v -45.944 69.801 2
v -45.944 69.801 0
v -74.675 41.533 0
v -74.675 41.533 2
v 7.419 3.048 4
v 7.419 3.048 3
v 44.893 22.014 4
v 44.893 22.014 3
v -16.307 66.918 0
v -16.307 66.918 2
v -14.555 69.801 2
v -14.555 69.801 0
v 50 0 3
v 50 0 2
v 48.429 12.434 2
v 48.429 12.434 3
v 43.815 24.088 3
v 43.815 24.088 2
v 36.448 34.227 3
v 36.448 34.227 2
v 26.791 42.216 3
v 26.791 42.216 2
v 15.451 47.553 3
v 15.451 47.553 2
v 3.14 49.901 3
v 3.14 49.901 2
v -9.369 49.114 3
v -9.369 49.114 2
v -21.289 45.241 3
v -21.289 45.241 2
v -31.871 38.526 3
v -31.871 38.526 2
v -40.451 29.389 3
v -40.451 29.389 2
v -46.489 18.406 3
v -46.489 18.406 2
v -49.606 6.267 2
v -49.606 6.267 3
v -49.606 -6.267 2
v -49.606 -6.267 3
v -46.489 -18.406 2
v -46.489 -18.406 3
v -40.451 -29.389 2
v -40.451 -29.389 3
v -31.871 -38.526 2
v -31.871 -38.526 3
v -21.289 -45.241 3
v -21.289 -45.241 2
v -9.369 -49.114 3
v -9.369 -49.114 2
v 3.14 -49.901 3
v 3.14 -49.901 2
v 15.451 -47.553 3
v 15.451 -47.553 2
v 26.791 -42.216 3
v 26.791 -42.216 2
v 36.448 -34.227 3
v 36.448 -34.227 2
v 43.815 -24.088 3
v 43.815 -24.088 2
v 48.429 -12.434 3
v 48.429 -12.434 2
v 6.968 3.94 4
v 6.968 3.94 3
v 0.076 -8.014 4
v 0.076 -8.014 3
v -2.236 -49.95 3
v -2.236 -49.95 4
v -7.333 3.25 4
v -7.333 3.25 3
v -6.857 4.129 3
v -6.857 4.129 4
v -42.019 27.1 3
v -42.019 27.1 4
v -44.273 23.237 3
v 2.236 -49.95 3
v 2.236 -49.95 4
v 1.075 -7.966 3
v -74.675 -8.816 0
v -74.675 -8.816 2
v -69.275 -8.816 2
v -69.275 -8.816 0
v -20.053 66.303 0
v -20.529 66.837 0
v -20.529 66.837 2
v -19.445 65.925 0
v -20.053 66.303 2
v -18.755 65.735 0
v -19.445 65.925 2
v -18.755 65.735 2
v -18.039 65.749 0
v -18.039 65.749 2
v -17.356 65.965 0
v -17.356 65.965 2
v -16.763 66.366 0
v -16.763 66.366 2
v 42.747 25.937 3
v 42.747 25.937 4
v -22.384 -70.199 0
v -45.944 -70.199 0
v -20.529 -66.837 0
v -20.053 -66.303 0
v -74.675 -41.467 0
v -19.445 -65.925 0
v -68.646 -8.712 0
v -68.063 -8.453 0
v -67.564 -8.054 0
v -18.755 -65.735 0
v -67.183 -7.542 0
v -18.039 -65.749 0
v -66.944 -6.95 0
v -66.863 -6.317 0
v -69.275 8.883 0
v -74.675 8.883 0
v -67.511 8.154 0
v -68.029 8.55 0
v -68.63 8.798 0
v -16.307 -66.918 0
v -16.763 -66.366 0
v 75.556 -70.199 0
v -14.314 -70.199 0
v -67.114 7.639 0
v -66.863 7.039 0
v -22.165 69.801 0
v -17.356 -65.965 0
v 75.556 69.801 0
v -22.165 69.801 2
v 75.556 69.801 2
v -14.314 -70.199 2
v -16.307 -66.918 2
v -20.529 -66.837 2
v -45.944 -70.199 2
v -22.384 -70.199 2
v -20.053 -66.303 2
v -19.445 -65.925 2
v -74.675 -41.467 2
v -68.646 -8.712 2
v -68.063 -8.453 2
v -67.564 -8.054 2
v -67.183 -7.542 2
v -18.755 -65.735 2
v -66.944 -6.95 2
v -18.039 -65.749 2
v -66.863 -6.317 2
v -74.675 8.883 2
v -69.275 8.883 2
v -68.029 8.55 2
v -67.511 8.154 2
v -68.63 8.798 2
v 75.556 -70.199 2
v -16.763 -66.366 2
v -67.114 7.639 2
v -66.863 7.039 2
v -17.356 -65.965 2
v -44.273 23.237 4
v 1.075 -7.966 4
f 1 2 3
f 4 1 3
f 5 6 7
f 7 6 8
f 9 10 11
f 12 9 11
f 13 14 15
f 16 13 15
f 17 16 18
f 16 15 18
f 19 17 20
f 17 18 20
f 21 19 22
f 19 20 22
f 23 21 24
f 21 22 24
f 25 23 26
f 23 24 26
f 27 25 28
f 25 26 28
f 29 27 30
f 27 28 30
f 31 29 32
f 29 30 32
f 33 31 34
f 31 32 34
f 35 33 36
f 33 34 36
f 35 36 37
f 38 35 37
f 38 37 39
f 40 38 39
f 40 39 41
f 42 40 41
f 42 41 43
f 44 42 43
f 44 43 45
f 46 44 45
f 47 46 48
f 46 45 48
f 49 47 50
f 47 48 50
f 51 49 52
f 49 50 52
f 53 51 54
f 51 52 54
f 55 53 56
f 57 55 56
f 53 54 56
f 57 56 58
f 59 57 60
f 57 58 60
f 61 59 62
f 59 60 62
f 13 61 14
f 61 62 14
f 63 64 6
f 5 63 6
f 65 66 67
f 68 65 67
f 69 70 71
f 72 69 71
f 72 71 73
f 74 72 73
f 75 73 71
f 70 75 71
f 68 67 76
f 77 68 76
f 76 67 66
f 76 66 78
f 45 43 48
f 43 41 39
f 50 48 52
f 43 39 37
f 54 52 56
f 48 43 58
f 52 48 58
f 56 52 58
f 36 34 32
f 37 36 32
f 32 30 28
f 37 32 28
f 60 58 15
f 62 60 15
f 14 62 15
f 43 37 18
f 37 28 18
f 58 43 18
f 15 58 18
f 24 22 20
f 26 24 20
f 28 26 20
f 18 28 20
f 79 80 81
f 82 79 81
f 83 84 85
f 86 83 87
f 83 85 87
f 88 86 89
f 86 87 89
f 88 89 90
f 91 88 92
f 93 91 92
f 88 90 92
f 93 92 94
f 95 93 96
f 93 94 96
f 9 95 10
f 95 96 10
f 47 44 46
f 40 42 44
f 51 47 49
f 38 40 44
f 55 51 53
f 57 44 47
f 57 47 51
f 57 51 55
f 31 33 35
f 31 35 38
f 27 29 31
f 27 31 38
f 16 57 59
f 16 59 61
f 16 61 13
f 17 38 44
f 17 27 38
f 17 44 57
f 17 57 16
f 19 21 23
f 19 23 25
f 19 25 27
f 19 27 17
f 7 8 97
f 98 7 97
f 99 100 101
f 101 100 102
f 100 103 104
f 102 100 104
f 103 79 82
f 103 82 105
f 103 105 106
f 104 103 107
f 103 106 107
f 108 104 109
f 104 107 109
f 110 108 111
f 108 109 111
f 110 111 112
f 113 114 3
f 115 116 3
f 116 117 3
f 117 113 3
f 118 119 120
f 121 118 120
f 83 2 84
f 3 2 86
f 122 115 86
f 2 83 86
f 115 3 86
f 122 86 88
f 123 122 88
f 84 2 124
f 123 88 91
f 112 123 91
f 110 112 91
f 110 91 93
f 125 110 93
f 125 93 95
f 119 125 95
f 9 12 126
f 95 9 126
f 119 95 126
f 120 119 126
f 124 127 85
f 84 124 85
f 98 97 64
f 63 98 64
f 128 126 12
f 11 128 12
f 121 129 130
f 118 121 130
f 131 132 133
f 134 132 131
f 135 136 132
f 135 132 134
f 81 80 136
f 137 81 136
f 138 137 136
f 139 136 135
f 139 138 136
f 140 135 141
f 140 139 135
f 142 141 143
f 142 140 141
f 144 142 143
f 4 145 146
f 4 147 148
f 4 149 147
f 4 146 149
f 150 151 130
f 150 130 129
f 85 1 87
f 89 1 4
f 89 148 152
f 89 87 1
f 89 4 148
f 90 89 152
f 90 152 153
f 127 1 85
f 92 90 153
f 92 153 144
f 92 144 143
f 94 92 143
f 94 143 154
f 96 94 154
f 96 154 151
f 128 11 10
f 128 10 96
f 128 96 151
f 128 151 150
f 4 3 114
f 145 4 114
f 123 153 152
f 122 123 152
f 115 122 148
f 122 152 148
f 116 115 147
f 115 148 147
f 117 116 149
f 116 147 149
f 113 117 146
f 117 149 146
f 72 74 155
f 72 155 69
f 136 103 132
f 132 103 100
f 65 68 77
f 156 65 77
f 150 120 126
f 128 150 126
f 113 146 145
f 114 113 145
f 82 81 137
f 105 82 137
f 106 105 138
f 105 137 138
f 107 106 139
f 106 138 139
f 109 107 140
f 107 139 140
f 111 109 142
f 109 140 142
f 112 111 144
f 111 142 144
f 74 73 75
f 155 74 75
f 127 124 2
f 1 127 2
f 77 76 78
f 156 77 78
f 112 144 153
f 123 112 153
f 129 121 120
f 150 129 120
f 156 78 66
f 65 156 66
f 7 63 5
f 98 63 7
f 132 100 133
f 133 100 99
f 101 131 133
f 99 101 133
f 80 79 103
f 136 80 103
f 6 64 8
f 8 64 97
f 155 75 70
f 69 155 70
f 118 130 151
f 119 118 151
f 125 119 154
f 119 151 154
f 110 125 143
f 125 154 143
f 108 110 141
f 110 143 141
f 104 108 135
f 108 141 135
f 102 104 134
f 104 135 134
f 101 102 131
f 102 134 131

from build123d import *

# Parameters (mm, degrees)
F1_DEPTH = 2
F3_DEPTH = 2.001
F4_R     = 50
F5_DEPTH = 1
F7_DEPTH = 1


with BuildPart() as f1:
    # F0 (on Top) → F1 (new body)
    with BuildSketch(Plane.XY):
        Polygon((75.556129, -70.198737), (75.556129, 69.801263), (-45.943871, 69.801263), (-74.675181, 41.532574), (-74.675181, -41.467426), (-45.943871, -70.198737), align=None)
    extrude(amount=F1_DEPTH)

    # F2 (on face) → F3 (cut, through all)
    with BuildSketch(Plane.XY.offset(2)):
        with BuildLine():
            Line((-69.275181, 8.882574), (-74.675181, 8.882574))
            Line((-74.675181, 8.882574), (-74.675181, -8.815888))
            Line((-74.675181, -8.815888), (-69.275181, -8.815888))
            ThreePointArc((-69.275181, -8.815888), (-67.564365, -8.053916), (-66.862866, -6.317426))
            Line((-66.862866, -6.317426), (-66.862866, 7.038877))
            ThreePointArc((-66.862866, 7.038877), (-67.757084, 8.368871), (-69.275181, 8.882574))
        make_face()
        with BuildLine():
            Line((-14.555379, 69.801263), (-22.164578, 69.801263))
            Line((-22.164578, 69.801263), (-20.529358, 66.837383))
            ThreePointArc((-20.529358, 66.837383), (-18.396211, 65.716511), (-16.307343, 66.917885))
            Line((-16.307343, 66.917885), (-14.555379, 69.801263))
        make_face()
        with BuildLine():
            Line((-20.529358, -66.837383), (-22.383871, -70.198737))
            Line((-22.383871, -70.198737), (-14.313871, -70.198737))
            Line((-14.313871, -70.198737), (-16.307343, -66.917885))
            ThreePointArc((-16.307343, -66.917885), (-18.396211, -65.716511), (-20.529358, -66.837383))
        make_face()
    extrude(amount=-F3_DEPTH, mode=Mode.SUBTRACT)


with BuildPart() as f5:
    # F4 (on face) → F5 (new body)
    with BuildSketch(Plane.XY.offset(2)):
        Circle(F4_R)
    extrude(amount=F5_DEPTH)


with BuildPart() as f7:
    # F6 (on face) → F7 (new body)
    with BuildSketch(Plane.XY.offset(3)):
        Polygon((-42.019164, 27.099628), (-44.272563, 23.236612), (-7.333016, 3.249871), (-6.857141, 4.129384), align=None)
        Polygon((0.076095, -8.013664), (-2.235708, -49.949991), (2.235708, -49.949991), (1.07496, -7.966034), align=None)
        Polygon((44.893218, 22.013609), (42.746617, 25.936976), (6.967818, 3.93976), (7.419391, 3.047526), align=None)
    extrude(amount=F7_DEPTH)


solid = Compound([f1.part, f5.part, f7.part])
